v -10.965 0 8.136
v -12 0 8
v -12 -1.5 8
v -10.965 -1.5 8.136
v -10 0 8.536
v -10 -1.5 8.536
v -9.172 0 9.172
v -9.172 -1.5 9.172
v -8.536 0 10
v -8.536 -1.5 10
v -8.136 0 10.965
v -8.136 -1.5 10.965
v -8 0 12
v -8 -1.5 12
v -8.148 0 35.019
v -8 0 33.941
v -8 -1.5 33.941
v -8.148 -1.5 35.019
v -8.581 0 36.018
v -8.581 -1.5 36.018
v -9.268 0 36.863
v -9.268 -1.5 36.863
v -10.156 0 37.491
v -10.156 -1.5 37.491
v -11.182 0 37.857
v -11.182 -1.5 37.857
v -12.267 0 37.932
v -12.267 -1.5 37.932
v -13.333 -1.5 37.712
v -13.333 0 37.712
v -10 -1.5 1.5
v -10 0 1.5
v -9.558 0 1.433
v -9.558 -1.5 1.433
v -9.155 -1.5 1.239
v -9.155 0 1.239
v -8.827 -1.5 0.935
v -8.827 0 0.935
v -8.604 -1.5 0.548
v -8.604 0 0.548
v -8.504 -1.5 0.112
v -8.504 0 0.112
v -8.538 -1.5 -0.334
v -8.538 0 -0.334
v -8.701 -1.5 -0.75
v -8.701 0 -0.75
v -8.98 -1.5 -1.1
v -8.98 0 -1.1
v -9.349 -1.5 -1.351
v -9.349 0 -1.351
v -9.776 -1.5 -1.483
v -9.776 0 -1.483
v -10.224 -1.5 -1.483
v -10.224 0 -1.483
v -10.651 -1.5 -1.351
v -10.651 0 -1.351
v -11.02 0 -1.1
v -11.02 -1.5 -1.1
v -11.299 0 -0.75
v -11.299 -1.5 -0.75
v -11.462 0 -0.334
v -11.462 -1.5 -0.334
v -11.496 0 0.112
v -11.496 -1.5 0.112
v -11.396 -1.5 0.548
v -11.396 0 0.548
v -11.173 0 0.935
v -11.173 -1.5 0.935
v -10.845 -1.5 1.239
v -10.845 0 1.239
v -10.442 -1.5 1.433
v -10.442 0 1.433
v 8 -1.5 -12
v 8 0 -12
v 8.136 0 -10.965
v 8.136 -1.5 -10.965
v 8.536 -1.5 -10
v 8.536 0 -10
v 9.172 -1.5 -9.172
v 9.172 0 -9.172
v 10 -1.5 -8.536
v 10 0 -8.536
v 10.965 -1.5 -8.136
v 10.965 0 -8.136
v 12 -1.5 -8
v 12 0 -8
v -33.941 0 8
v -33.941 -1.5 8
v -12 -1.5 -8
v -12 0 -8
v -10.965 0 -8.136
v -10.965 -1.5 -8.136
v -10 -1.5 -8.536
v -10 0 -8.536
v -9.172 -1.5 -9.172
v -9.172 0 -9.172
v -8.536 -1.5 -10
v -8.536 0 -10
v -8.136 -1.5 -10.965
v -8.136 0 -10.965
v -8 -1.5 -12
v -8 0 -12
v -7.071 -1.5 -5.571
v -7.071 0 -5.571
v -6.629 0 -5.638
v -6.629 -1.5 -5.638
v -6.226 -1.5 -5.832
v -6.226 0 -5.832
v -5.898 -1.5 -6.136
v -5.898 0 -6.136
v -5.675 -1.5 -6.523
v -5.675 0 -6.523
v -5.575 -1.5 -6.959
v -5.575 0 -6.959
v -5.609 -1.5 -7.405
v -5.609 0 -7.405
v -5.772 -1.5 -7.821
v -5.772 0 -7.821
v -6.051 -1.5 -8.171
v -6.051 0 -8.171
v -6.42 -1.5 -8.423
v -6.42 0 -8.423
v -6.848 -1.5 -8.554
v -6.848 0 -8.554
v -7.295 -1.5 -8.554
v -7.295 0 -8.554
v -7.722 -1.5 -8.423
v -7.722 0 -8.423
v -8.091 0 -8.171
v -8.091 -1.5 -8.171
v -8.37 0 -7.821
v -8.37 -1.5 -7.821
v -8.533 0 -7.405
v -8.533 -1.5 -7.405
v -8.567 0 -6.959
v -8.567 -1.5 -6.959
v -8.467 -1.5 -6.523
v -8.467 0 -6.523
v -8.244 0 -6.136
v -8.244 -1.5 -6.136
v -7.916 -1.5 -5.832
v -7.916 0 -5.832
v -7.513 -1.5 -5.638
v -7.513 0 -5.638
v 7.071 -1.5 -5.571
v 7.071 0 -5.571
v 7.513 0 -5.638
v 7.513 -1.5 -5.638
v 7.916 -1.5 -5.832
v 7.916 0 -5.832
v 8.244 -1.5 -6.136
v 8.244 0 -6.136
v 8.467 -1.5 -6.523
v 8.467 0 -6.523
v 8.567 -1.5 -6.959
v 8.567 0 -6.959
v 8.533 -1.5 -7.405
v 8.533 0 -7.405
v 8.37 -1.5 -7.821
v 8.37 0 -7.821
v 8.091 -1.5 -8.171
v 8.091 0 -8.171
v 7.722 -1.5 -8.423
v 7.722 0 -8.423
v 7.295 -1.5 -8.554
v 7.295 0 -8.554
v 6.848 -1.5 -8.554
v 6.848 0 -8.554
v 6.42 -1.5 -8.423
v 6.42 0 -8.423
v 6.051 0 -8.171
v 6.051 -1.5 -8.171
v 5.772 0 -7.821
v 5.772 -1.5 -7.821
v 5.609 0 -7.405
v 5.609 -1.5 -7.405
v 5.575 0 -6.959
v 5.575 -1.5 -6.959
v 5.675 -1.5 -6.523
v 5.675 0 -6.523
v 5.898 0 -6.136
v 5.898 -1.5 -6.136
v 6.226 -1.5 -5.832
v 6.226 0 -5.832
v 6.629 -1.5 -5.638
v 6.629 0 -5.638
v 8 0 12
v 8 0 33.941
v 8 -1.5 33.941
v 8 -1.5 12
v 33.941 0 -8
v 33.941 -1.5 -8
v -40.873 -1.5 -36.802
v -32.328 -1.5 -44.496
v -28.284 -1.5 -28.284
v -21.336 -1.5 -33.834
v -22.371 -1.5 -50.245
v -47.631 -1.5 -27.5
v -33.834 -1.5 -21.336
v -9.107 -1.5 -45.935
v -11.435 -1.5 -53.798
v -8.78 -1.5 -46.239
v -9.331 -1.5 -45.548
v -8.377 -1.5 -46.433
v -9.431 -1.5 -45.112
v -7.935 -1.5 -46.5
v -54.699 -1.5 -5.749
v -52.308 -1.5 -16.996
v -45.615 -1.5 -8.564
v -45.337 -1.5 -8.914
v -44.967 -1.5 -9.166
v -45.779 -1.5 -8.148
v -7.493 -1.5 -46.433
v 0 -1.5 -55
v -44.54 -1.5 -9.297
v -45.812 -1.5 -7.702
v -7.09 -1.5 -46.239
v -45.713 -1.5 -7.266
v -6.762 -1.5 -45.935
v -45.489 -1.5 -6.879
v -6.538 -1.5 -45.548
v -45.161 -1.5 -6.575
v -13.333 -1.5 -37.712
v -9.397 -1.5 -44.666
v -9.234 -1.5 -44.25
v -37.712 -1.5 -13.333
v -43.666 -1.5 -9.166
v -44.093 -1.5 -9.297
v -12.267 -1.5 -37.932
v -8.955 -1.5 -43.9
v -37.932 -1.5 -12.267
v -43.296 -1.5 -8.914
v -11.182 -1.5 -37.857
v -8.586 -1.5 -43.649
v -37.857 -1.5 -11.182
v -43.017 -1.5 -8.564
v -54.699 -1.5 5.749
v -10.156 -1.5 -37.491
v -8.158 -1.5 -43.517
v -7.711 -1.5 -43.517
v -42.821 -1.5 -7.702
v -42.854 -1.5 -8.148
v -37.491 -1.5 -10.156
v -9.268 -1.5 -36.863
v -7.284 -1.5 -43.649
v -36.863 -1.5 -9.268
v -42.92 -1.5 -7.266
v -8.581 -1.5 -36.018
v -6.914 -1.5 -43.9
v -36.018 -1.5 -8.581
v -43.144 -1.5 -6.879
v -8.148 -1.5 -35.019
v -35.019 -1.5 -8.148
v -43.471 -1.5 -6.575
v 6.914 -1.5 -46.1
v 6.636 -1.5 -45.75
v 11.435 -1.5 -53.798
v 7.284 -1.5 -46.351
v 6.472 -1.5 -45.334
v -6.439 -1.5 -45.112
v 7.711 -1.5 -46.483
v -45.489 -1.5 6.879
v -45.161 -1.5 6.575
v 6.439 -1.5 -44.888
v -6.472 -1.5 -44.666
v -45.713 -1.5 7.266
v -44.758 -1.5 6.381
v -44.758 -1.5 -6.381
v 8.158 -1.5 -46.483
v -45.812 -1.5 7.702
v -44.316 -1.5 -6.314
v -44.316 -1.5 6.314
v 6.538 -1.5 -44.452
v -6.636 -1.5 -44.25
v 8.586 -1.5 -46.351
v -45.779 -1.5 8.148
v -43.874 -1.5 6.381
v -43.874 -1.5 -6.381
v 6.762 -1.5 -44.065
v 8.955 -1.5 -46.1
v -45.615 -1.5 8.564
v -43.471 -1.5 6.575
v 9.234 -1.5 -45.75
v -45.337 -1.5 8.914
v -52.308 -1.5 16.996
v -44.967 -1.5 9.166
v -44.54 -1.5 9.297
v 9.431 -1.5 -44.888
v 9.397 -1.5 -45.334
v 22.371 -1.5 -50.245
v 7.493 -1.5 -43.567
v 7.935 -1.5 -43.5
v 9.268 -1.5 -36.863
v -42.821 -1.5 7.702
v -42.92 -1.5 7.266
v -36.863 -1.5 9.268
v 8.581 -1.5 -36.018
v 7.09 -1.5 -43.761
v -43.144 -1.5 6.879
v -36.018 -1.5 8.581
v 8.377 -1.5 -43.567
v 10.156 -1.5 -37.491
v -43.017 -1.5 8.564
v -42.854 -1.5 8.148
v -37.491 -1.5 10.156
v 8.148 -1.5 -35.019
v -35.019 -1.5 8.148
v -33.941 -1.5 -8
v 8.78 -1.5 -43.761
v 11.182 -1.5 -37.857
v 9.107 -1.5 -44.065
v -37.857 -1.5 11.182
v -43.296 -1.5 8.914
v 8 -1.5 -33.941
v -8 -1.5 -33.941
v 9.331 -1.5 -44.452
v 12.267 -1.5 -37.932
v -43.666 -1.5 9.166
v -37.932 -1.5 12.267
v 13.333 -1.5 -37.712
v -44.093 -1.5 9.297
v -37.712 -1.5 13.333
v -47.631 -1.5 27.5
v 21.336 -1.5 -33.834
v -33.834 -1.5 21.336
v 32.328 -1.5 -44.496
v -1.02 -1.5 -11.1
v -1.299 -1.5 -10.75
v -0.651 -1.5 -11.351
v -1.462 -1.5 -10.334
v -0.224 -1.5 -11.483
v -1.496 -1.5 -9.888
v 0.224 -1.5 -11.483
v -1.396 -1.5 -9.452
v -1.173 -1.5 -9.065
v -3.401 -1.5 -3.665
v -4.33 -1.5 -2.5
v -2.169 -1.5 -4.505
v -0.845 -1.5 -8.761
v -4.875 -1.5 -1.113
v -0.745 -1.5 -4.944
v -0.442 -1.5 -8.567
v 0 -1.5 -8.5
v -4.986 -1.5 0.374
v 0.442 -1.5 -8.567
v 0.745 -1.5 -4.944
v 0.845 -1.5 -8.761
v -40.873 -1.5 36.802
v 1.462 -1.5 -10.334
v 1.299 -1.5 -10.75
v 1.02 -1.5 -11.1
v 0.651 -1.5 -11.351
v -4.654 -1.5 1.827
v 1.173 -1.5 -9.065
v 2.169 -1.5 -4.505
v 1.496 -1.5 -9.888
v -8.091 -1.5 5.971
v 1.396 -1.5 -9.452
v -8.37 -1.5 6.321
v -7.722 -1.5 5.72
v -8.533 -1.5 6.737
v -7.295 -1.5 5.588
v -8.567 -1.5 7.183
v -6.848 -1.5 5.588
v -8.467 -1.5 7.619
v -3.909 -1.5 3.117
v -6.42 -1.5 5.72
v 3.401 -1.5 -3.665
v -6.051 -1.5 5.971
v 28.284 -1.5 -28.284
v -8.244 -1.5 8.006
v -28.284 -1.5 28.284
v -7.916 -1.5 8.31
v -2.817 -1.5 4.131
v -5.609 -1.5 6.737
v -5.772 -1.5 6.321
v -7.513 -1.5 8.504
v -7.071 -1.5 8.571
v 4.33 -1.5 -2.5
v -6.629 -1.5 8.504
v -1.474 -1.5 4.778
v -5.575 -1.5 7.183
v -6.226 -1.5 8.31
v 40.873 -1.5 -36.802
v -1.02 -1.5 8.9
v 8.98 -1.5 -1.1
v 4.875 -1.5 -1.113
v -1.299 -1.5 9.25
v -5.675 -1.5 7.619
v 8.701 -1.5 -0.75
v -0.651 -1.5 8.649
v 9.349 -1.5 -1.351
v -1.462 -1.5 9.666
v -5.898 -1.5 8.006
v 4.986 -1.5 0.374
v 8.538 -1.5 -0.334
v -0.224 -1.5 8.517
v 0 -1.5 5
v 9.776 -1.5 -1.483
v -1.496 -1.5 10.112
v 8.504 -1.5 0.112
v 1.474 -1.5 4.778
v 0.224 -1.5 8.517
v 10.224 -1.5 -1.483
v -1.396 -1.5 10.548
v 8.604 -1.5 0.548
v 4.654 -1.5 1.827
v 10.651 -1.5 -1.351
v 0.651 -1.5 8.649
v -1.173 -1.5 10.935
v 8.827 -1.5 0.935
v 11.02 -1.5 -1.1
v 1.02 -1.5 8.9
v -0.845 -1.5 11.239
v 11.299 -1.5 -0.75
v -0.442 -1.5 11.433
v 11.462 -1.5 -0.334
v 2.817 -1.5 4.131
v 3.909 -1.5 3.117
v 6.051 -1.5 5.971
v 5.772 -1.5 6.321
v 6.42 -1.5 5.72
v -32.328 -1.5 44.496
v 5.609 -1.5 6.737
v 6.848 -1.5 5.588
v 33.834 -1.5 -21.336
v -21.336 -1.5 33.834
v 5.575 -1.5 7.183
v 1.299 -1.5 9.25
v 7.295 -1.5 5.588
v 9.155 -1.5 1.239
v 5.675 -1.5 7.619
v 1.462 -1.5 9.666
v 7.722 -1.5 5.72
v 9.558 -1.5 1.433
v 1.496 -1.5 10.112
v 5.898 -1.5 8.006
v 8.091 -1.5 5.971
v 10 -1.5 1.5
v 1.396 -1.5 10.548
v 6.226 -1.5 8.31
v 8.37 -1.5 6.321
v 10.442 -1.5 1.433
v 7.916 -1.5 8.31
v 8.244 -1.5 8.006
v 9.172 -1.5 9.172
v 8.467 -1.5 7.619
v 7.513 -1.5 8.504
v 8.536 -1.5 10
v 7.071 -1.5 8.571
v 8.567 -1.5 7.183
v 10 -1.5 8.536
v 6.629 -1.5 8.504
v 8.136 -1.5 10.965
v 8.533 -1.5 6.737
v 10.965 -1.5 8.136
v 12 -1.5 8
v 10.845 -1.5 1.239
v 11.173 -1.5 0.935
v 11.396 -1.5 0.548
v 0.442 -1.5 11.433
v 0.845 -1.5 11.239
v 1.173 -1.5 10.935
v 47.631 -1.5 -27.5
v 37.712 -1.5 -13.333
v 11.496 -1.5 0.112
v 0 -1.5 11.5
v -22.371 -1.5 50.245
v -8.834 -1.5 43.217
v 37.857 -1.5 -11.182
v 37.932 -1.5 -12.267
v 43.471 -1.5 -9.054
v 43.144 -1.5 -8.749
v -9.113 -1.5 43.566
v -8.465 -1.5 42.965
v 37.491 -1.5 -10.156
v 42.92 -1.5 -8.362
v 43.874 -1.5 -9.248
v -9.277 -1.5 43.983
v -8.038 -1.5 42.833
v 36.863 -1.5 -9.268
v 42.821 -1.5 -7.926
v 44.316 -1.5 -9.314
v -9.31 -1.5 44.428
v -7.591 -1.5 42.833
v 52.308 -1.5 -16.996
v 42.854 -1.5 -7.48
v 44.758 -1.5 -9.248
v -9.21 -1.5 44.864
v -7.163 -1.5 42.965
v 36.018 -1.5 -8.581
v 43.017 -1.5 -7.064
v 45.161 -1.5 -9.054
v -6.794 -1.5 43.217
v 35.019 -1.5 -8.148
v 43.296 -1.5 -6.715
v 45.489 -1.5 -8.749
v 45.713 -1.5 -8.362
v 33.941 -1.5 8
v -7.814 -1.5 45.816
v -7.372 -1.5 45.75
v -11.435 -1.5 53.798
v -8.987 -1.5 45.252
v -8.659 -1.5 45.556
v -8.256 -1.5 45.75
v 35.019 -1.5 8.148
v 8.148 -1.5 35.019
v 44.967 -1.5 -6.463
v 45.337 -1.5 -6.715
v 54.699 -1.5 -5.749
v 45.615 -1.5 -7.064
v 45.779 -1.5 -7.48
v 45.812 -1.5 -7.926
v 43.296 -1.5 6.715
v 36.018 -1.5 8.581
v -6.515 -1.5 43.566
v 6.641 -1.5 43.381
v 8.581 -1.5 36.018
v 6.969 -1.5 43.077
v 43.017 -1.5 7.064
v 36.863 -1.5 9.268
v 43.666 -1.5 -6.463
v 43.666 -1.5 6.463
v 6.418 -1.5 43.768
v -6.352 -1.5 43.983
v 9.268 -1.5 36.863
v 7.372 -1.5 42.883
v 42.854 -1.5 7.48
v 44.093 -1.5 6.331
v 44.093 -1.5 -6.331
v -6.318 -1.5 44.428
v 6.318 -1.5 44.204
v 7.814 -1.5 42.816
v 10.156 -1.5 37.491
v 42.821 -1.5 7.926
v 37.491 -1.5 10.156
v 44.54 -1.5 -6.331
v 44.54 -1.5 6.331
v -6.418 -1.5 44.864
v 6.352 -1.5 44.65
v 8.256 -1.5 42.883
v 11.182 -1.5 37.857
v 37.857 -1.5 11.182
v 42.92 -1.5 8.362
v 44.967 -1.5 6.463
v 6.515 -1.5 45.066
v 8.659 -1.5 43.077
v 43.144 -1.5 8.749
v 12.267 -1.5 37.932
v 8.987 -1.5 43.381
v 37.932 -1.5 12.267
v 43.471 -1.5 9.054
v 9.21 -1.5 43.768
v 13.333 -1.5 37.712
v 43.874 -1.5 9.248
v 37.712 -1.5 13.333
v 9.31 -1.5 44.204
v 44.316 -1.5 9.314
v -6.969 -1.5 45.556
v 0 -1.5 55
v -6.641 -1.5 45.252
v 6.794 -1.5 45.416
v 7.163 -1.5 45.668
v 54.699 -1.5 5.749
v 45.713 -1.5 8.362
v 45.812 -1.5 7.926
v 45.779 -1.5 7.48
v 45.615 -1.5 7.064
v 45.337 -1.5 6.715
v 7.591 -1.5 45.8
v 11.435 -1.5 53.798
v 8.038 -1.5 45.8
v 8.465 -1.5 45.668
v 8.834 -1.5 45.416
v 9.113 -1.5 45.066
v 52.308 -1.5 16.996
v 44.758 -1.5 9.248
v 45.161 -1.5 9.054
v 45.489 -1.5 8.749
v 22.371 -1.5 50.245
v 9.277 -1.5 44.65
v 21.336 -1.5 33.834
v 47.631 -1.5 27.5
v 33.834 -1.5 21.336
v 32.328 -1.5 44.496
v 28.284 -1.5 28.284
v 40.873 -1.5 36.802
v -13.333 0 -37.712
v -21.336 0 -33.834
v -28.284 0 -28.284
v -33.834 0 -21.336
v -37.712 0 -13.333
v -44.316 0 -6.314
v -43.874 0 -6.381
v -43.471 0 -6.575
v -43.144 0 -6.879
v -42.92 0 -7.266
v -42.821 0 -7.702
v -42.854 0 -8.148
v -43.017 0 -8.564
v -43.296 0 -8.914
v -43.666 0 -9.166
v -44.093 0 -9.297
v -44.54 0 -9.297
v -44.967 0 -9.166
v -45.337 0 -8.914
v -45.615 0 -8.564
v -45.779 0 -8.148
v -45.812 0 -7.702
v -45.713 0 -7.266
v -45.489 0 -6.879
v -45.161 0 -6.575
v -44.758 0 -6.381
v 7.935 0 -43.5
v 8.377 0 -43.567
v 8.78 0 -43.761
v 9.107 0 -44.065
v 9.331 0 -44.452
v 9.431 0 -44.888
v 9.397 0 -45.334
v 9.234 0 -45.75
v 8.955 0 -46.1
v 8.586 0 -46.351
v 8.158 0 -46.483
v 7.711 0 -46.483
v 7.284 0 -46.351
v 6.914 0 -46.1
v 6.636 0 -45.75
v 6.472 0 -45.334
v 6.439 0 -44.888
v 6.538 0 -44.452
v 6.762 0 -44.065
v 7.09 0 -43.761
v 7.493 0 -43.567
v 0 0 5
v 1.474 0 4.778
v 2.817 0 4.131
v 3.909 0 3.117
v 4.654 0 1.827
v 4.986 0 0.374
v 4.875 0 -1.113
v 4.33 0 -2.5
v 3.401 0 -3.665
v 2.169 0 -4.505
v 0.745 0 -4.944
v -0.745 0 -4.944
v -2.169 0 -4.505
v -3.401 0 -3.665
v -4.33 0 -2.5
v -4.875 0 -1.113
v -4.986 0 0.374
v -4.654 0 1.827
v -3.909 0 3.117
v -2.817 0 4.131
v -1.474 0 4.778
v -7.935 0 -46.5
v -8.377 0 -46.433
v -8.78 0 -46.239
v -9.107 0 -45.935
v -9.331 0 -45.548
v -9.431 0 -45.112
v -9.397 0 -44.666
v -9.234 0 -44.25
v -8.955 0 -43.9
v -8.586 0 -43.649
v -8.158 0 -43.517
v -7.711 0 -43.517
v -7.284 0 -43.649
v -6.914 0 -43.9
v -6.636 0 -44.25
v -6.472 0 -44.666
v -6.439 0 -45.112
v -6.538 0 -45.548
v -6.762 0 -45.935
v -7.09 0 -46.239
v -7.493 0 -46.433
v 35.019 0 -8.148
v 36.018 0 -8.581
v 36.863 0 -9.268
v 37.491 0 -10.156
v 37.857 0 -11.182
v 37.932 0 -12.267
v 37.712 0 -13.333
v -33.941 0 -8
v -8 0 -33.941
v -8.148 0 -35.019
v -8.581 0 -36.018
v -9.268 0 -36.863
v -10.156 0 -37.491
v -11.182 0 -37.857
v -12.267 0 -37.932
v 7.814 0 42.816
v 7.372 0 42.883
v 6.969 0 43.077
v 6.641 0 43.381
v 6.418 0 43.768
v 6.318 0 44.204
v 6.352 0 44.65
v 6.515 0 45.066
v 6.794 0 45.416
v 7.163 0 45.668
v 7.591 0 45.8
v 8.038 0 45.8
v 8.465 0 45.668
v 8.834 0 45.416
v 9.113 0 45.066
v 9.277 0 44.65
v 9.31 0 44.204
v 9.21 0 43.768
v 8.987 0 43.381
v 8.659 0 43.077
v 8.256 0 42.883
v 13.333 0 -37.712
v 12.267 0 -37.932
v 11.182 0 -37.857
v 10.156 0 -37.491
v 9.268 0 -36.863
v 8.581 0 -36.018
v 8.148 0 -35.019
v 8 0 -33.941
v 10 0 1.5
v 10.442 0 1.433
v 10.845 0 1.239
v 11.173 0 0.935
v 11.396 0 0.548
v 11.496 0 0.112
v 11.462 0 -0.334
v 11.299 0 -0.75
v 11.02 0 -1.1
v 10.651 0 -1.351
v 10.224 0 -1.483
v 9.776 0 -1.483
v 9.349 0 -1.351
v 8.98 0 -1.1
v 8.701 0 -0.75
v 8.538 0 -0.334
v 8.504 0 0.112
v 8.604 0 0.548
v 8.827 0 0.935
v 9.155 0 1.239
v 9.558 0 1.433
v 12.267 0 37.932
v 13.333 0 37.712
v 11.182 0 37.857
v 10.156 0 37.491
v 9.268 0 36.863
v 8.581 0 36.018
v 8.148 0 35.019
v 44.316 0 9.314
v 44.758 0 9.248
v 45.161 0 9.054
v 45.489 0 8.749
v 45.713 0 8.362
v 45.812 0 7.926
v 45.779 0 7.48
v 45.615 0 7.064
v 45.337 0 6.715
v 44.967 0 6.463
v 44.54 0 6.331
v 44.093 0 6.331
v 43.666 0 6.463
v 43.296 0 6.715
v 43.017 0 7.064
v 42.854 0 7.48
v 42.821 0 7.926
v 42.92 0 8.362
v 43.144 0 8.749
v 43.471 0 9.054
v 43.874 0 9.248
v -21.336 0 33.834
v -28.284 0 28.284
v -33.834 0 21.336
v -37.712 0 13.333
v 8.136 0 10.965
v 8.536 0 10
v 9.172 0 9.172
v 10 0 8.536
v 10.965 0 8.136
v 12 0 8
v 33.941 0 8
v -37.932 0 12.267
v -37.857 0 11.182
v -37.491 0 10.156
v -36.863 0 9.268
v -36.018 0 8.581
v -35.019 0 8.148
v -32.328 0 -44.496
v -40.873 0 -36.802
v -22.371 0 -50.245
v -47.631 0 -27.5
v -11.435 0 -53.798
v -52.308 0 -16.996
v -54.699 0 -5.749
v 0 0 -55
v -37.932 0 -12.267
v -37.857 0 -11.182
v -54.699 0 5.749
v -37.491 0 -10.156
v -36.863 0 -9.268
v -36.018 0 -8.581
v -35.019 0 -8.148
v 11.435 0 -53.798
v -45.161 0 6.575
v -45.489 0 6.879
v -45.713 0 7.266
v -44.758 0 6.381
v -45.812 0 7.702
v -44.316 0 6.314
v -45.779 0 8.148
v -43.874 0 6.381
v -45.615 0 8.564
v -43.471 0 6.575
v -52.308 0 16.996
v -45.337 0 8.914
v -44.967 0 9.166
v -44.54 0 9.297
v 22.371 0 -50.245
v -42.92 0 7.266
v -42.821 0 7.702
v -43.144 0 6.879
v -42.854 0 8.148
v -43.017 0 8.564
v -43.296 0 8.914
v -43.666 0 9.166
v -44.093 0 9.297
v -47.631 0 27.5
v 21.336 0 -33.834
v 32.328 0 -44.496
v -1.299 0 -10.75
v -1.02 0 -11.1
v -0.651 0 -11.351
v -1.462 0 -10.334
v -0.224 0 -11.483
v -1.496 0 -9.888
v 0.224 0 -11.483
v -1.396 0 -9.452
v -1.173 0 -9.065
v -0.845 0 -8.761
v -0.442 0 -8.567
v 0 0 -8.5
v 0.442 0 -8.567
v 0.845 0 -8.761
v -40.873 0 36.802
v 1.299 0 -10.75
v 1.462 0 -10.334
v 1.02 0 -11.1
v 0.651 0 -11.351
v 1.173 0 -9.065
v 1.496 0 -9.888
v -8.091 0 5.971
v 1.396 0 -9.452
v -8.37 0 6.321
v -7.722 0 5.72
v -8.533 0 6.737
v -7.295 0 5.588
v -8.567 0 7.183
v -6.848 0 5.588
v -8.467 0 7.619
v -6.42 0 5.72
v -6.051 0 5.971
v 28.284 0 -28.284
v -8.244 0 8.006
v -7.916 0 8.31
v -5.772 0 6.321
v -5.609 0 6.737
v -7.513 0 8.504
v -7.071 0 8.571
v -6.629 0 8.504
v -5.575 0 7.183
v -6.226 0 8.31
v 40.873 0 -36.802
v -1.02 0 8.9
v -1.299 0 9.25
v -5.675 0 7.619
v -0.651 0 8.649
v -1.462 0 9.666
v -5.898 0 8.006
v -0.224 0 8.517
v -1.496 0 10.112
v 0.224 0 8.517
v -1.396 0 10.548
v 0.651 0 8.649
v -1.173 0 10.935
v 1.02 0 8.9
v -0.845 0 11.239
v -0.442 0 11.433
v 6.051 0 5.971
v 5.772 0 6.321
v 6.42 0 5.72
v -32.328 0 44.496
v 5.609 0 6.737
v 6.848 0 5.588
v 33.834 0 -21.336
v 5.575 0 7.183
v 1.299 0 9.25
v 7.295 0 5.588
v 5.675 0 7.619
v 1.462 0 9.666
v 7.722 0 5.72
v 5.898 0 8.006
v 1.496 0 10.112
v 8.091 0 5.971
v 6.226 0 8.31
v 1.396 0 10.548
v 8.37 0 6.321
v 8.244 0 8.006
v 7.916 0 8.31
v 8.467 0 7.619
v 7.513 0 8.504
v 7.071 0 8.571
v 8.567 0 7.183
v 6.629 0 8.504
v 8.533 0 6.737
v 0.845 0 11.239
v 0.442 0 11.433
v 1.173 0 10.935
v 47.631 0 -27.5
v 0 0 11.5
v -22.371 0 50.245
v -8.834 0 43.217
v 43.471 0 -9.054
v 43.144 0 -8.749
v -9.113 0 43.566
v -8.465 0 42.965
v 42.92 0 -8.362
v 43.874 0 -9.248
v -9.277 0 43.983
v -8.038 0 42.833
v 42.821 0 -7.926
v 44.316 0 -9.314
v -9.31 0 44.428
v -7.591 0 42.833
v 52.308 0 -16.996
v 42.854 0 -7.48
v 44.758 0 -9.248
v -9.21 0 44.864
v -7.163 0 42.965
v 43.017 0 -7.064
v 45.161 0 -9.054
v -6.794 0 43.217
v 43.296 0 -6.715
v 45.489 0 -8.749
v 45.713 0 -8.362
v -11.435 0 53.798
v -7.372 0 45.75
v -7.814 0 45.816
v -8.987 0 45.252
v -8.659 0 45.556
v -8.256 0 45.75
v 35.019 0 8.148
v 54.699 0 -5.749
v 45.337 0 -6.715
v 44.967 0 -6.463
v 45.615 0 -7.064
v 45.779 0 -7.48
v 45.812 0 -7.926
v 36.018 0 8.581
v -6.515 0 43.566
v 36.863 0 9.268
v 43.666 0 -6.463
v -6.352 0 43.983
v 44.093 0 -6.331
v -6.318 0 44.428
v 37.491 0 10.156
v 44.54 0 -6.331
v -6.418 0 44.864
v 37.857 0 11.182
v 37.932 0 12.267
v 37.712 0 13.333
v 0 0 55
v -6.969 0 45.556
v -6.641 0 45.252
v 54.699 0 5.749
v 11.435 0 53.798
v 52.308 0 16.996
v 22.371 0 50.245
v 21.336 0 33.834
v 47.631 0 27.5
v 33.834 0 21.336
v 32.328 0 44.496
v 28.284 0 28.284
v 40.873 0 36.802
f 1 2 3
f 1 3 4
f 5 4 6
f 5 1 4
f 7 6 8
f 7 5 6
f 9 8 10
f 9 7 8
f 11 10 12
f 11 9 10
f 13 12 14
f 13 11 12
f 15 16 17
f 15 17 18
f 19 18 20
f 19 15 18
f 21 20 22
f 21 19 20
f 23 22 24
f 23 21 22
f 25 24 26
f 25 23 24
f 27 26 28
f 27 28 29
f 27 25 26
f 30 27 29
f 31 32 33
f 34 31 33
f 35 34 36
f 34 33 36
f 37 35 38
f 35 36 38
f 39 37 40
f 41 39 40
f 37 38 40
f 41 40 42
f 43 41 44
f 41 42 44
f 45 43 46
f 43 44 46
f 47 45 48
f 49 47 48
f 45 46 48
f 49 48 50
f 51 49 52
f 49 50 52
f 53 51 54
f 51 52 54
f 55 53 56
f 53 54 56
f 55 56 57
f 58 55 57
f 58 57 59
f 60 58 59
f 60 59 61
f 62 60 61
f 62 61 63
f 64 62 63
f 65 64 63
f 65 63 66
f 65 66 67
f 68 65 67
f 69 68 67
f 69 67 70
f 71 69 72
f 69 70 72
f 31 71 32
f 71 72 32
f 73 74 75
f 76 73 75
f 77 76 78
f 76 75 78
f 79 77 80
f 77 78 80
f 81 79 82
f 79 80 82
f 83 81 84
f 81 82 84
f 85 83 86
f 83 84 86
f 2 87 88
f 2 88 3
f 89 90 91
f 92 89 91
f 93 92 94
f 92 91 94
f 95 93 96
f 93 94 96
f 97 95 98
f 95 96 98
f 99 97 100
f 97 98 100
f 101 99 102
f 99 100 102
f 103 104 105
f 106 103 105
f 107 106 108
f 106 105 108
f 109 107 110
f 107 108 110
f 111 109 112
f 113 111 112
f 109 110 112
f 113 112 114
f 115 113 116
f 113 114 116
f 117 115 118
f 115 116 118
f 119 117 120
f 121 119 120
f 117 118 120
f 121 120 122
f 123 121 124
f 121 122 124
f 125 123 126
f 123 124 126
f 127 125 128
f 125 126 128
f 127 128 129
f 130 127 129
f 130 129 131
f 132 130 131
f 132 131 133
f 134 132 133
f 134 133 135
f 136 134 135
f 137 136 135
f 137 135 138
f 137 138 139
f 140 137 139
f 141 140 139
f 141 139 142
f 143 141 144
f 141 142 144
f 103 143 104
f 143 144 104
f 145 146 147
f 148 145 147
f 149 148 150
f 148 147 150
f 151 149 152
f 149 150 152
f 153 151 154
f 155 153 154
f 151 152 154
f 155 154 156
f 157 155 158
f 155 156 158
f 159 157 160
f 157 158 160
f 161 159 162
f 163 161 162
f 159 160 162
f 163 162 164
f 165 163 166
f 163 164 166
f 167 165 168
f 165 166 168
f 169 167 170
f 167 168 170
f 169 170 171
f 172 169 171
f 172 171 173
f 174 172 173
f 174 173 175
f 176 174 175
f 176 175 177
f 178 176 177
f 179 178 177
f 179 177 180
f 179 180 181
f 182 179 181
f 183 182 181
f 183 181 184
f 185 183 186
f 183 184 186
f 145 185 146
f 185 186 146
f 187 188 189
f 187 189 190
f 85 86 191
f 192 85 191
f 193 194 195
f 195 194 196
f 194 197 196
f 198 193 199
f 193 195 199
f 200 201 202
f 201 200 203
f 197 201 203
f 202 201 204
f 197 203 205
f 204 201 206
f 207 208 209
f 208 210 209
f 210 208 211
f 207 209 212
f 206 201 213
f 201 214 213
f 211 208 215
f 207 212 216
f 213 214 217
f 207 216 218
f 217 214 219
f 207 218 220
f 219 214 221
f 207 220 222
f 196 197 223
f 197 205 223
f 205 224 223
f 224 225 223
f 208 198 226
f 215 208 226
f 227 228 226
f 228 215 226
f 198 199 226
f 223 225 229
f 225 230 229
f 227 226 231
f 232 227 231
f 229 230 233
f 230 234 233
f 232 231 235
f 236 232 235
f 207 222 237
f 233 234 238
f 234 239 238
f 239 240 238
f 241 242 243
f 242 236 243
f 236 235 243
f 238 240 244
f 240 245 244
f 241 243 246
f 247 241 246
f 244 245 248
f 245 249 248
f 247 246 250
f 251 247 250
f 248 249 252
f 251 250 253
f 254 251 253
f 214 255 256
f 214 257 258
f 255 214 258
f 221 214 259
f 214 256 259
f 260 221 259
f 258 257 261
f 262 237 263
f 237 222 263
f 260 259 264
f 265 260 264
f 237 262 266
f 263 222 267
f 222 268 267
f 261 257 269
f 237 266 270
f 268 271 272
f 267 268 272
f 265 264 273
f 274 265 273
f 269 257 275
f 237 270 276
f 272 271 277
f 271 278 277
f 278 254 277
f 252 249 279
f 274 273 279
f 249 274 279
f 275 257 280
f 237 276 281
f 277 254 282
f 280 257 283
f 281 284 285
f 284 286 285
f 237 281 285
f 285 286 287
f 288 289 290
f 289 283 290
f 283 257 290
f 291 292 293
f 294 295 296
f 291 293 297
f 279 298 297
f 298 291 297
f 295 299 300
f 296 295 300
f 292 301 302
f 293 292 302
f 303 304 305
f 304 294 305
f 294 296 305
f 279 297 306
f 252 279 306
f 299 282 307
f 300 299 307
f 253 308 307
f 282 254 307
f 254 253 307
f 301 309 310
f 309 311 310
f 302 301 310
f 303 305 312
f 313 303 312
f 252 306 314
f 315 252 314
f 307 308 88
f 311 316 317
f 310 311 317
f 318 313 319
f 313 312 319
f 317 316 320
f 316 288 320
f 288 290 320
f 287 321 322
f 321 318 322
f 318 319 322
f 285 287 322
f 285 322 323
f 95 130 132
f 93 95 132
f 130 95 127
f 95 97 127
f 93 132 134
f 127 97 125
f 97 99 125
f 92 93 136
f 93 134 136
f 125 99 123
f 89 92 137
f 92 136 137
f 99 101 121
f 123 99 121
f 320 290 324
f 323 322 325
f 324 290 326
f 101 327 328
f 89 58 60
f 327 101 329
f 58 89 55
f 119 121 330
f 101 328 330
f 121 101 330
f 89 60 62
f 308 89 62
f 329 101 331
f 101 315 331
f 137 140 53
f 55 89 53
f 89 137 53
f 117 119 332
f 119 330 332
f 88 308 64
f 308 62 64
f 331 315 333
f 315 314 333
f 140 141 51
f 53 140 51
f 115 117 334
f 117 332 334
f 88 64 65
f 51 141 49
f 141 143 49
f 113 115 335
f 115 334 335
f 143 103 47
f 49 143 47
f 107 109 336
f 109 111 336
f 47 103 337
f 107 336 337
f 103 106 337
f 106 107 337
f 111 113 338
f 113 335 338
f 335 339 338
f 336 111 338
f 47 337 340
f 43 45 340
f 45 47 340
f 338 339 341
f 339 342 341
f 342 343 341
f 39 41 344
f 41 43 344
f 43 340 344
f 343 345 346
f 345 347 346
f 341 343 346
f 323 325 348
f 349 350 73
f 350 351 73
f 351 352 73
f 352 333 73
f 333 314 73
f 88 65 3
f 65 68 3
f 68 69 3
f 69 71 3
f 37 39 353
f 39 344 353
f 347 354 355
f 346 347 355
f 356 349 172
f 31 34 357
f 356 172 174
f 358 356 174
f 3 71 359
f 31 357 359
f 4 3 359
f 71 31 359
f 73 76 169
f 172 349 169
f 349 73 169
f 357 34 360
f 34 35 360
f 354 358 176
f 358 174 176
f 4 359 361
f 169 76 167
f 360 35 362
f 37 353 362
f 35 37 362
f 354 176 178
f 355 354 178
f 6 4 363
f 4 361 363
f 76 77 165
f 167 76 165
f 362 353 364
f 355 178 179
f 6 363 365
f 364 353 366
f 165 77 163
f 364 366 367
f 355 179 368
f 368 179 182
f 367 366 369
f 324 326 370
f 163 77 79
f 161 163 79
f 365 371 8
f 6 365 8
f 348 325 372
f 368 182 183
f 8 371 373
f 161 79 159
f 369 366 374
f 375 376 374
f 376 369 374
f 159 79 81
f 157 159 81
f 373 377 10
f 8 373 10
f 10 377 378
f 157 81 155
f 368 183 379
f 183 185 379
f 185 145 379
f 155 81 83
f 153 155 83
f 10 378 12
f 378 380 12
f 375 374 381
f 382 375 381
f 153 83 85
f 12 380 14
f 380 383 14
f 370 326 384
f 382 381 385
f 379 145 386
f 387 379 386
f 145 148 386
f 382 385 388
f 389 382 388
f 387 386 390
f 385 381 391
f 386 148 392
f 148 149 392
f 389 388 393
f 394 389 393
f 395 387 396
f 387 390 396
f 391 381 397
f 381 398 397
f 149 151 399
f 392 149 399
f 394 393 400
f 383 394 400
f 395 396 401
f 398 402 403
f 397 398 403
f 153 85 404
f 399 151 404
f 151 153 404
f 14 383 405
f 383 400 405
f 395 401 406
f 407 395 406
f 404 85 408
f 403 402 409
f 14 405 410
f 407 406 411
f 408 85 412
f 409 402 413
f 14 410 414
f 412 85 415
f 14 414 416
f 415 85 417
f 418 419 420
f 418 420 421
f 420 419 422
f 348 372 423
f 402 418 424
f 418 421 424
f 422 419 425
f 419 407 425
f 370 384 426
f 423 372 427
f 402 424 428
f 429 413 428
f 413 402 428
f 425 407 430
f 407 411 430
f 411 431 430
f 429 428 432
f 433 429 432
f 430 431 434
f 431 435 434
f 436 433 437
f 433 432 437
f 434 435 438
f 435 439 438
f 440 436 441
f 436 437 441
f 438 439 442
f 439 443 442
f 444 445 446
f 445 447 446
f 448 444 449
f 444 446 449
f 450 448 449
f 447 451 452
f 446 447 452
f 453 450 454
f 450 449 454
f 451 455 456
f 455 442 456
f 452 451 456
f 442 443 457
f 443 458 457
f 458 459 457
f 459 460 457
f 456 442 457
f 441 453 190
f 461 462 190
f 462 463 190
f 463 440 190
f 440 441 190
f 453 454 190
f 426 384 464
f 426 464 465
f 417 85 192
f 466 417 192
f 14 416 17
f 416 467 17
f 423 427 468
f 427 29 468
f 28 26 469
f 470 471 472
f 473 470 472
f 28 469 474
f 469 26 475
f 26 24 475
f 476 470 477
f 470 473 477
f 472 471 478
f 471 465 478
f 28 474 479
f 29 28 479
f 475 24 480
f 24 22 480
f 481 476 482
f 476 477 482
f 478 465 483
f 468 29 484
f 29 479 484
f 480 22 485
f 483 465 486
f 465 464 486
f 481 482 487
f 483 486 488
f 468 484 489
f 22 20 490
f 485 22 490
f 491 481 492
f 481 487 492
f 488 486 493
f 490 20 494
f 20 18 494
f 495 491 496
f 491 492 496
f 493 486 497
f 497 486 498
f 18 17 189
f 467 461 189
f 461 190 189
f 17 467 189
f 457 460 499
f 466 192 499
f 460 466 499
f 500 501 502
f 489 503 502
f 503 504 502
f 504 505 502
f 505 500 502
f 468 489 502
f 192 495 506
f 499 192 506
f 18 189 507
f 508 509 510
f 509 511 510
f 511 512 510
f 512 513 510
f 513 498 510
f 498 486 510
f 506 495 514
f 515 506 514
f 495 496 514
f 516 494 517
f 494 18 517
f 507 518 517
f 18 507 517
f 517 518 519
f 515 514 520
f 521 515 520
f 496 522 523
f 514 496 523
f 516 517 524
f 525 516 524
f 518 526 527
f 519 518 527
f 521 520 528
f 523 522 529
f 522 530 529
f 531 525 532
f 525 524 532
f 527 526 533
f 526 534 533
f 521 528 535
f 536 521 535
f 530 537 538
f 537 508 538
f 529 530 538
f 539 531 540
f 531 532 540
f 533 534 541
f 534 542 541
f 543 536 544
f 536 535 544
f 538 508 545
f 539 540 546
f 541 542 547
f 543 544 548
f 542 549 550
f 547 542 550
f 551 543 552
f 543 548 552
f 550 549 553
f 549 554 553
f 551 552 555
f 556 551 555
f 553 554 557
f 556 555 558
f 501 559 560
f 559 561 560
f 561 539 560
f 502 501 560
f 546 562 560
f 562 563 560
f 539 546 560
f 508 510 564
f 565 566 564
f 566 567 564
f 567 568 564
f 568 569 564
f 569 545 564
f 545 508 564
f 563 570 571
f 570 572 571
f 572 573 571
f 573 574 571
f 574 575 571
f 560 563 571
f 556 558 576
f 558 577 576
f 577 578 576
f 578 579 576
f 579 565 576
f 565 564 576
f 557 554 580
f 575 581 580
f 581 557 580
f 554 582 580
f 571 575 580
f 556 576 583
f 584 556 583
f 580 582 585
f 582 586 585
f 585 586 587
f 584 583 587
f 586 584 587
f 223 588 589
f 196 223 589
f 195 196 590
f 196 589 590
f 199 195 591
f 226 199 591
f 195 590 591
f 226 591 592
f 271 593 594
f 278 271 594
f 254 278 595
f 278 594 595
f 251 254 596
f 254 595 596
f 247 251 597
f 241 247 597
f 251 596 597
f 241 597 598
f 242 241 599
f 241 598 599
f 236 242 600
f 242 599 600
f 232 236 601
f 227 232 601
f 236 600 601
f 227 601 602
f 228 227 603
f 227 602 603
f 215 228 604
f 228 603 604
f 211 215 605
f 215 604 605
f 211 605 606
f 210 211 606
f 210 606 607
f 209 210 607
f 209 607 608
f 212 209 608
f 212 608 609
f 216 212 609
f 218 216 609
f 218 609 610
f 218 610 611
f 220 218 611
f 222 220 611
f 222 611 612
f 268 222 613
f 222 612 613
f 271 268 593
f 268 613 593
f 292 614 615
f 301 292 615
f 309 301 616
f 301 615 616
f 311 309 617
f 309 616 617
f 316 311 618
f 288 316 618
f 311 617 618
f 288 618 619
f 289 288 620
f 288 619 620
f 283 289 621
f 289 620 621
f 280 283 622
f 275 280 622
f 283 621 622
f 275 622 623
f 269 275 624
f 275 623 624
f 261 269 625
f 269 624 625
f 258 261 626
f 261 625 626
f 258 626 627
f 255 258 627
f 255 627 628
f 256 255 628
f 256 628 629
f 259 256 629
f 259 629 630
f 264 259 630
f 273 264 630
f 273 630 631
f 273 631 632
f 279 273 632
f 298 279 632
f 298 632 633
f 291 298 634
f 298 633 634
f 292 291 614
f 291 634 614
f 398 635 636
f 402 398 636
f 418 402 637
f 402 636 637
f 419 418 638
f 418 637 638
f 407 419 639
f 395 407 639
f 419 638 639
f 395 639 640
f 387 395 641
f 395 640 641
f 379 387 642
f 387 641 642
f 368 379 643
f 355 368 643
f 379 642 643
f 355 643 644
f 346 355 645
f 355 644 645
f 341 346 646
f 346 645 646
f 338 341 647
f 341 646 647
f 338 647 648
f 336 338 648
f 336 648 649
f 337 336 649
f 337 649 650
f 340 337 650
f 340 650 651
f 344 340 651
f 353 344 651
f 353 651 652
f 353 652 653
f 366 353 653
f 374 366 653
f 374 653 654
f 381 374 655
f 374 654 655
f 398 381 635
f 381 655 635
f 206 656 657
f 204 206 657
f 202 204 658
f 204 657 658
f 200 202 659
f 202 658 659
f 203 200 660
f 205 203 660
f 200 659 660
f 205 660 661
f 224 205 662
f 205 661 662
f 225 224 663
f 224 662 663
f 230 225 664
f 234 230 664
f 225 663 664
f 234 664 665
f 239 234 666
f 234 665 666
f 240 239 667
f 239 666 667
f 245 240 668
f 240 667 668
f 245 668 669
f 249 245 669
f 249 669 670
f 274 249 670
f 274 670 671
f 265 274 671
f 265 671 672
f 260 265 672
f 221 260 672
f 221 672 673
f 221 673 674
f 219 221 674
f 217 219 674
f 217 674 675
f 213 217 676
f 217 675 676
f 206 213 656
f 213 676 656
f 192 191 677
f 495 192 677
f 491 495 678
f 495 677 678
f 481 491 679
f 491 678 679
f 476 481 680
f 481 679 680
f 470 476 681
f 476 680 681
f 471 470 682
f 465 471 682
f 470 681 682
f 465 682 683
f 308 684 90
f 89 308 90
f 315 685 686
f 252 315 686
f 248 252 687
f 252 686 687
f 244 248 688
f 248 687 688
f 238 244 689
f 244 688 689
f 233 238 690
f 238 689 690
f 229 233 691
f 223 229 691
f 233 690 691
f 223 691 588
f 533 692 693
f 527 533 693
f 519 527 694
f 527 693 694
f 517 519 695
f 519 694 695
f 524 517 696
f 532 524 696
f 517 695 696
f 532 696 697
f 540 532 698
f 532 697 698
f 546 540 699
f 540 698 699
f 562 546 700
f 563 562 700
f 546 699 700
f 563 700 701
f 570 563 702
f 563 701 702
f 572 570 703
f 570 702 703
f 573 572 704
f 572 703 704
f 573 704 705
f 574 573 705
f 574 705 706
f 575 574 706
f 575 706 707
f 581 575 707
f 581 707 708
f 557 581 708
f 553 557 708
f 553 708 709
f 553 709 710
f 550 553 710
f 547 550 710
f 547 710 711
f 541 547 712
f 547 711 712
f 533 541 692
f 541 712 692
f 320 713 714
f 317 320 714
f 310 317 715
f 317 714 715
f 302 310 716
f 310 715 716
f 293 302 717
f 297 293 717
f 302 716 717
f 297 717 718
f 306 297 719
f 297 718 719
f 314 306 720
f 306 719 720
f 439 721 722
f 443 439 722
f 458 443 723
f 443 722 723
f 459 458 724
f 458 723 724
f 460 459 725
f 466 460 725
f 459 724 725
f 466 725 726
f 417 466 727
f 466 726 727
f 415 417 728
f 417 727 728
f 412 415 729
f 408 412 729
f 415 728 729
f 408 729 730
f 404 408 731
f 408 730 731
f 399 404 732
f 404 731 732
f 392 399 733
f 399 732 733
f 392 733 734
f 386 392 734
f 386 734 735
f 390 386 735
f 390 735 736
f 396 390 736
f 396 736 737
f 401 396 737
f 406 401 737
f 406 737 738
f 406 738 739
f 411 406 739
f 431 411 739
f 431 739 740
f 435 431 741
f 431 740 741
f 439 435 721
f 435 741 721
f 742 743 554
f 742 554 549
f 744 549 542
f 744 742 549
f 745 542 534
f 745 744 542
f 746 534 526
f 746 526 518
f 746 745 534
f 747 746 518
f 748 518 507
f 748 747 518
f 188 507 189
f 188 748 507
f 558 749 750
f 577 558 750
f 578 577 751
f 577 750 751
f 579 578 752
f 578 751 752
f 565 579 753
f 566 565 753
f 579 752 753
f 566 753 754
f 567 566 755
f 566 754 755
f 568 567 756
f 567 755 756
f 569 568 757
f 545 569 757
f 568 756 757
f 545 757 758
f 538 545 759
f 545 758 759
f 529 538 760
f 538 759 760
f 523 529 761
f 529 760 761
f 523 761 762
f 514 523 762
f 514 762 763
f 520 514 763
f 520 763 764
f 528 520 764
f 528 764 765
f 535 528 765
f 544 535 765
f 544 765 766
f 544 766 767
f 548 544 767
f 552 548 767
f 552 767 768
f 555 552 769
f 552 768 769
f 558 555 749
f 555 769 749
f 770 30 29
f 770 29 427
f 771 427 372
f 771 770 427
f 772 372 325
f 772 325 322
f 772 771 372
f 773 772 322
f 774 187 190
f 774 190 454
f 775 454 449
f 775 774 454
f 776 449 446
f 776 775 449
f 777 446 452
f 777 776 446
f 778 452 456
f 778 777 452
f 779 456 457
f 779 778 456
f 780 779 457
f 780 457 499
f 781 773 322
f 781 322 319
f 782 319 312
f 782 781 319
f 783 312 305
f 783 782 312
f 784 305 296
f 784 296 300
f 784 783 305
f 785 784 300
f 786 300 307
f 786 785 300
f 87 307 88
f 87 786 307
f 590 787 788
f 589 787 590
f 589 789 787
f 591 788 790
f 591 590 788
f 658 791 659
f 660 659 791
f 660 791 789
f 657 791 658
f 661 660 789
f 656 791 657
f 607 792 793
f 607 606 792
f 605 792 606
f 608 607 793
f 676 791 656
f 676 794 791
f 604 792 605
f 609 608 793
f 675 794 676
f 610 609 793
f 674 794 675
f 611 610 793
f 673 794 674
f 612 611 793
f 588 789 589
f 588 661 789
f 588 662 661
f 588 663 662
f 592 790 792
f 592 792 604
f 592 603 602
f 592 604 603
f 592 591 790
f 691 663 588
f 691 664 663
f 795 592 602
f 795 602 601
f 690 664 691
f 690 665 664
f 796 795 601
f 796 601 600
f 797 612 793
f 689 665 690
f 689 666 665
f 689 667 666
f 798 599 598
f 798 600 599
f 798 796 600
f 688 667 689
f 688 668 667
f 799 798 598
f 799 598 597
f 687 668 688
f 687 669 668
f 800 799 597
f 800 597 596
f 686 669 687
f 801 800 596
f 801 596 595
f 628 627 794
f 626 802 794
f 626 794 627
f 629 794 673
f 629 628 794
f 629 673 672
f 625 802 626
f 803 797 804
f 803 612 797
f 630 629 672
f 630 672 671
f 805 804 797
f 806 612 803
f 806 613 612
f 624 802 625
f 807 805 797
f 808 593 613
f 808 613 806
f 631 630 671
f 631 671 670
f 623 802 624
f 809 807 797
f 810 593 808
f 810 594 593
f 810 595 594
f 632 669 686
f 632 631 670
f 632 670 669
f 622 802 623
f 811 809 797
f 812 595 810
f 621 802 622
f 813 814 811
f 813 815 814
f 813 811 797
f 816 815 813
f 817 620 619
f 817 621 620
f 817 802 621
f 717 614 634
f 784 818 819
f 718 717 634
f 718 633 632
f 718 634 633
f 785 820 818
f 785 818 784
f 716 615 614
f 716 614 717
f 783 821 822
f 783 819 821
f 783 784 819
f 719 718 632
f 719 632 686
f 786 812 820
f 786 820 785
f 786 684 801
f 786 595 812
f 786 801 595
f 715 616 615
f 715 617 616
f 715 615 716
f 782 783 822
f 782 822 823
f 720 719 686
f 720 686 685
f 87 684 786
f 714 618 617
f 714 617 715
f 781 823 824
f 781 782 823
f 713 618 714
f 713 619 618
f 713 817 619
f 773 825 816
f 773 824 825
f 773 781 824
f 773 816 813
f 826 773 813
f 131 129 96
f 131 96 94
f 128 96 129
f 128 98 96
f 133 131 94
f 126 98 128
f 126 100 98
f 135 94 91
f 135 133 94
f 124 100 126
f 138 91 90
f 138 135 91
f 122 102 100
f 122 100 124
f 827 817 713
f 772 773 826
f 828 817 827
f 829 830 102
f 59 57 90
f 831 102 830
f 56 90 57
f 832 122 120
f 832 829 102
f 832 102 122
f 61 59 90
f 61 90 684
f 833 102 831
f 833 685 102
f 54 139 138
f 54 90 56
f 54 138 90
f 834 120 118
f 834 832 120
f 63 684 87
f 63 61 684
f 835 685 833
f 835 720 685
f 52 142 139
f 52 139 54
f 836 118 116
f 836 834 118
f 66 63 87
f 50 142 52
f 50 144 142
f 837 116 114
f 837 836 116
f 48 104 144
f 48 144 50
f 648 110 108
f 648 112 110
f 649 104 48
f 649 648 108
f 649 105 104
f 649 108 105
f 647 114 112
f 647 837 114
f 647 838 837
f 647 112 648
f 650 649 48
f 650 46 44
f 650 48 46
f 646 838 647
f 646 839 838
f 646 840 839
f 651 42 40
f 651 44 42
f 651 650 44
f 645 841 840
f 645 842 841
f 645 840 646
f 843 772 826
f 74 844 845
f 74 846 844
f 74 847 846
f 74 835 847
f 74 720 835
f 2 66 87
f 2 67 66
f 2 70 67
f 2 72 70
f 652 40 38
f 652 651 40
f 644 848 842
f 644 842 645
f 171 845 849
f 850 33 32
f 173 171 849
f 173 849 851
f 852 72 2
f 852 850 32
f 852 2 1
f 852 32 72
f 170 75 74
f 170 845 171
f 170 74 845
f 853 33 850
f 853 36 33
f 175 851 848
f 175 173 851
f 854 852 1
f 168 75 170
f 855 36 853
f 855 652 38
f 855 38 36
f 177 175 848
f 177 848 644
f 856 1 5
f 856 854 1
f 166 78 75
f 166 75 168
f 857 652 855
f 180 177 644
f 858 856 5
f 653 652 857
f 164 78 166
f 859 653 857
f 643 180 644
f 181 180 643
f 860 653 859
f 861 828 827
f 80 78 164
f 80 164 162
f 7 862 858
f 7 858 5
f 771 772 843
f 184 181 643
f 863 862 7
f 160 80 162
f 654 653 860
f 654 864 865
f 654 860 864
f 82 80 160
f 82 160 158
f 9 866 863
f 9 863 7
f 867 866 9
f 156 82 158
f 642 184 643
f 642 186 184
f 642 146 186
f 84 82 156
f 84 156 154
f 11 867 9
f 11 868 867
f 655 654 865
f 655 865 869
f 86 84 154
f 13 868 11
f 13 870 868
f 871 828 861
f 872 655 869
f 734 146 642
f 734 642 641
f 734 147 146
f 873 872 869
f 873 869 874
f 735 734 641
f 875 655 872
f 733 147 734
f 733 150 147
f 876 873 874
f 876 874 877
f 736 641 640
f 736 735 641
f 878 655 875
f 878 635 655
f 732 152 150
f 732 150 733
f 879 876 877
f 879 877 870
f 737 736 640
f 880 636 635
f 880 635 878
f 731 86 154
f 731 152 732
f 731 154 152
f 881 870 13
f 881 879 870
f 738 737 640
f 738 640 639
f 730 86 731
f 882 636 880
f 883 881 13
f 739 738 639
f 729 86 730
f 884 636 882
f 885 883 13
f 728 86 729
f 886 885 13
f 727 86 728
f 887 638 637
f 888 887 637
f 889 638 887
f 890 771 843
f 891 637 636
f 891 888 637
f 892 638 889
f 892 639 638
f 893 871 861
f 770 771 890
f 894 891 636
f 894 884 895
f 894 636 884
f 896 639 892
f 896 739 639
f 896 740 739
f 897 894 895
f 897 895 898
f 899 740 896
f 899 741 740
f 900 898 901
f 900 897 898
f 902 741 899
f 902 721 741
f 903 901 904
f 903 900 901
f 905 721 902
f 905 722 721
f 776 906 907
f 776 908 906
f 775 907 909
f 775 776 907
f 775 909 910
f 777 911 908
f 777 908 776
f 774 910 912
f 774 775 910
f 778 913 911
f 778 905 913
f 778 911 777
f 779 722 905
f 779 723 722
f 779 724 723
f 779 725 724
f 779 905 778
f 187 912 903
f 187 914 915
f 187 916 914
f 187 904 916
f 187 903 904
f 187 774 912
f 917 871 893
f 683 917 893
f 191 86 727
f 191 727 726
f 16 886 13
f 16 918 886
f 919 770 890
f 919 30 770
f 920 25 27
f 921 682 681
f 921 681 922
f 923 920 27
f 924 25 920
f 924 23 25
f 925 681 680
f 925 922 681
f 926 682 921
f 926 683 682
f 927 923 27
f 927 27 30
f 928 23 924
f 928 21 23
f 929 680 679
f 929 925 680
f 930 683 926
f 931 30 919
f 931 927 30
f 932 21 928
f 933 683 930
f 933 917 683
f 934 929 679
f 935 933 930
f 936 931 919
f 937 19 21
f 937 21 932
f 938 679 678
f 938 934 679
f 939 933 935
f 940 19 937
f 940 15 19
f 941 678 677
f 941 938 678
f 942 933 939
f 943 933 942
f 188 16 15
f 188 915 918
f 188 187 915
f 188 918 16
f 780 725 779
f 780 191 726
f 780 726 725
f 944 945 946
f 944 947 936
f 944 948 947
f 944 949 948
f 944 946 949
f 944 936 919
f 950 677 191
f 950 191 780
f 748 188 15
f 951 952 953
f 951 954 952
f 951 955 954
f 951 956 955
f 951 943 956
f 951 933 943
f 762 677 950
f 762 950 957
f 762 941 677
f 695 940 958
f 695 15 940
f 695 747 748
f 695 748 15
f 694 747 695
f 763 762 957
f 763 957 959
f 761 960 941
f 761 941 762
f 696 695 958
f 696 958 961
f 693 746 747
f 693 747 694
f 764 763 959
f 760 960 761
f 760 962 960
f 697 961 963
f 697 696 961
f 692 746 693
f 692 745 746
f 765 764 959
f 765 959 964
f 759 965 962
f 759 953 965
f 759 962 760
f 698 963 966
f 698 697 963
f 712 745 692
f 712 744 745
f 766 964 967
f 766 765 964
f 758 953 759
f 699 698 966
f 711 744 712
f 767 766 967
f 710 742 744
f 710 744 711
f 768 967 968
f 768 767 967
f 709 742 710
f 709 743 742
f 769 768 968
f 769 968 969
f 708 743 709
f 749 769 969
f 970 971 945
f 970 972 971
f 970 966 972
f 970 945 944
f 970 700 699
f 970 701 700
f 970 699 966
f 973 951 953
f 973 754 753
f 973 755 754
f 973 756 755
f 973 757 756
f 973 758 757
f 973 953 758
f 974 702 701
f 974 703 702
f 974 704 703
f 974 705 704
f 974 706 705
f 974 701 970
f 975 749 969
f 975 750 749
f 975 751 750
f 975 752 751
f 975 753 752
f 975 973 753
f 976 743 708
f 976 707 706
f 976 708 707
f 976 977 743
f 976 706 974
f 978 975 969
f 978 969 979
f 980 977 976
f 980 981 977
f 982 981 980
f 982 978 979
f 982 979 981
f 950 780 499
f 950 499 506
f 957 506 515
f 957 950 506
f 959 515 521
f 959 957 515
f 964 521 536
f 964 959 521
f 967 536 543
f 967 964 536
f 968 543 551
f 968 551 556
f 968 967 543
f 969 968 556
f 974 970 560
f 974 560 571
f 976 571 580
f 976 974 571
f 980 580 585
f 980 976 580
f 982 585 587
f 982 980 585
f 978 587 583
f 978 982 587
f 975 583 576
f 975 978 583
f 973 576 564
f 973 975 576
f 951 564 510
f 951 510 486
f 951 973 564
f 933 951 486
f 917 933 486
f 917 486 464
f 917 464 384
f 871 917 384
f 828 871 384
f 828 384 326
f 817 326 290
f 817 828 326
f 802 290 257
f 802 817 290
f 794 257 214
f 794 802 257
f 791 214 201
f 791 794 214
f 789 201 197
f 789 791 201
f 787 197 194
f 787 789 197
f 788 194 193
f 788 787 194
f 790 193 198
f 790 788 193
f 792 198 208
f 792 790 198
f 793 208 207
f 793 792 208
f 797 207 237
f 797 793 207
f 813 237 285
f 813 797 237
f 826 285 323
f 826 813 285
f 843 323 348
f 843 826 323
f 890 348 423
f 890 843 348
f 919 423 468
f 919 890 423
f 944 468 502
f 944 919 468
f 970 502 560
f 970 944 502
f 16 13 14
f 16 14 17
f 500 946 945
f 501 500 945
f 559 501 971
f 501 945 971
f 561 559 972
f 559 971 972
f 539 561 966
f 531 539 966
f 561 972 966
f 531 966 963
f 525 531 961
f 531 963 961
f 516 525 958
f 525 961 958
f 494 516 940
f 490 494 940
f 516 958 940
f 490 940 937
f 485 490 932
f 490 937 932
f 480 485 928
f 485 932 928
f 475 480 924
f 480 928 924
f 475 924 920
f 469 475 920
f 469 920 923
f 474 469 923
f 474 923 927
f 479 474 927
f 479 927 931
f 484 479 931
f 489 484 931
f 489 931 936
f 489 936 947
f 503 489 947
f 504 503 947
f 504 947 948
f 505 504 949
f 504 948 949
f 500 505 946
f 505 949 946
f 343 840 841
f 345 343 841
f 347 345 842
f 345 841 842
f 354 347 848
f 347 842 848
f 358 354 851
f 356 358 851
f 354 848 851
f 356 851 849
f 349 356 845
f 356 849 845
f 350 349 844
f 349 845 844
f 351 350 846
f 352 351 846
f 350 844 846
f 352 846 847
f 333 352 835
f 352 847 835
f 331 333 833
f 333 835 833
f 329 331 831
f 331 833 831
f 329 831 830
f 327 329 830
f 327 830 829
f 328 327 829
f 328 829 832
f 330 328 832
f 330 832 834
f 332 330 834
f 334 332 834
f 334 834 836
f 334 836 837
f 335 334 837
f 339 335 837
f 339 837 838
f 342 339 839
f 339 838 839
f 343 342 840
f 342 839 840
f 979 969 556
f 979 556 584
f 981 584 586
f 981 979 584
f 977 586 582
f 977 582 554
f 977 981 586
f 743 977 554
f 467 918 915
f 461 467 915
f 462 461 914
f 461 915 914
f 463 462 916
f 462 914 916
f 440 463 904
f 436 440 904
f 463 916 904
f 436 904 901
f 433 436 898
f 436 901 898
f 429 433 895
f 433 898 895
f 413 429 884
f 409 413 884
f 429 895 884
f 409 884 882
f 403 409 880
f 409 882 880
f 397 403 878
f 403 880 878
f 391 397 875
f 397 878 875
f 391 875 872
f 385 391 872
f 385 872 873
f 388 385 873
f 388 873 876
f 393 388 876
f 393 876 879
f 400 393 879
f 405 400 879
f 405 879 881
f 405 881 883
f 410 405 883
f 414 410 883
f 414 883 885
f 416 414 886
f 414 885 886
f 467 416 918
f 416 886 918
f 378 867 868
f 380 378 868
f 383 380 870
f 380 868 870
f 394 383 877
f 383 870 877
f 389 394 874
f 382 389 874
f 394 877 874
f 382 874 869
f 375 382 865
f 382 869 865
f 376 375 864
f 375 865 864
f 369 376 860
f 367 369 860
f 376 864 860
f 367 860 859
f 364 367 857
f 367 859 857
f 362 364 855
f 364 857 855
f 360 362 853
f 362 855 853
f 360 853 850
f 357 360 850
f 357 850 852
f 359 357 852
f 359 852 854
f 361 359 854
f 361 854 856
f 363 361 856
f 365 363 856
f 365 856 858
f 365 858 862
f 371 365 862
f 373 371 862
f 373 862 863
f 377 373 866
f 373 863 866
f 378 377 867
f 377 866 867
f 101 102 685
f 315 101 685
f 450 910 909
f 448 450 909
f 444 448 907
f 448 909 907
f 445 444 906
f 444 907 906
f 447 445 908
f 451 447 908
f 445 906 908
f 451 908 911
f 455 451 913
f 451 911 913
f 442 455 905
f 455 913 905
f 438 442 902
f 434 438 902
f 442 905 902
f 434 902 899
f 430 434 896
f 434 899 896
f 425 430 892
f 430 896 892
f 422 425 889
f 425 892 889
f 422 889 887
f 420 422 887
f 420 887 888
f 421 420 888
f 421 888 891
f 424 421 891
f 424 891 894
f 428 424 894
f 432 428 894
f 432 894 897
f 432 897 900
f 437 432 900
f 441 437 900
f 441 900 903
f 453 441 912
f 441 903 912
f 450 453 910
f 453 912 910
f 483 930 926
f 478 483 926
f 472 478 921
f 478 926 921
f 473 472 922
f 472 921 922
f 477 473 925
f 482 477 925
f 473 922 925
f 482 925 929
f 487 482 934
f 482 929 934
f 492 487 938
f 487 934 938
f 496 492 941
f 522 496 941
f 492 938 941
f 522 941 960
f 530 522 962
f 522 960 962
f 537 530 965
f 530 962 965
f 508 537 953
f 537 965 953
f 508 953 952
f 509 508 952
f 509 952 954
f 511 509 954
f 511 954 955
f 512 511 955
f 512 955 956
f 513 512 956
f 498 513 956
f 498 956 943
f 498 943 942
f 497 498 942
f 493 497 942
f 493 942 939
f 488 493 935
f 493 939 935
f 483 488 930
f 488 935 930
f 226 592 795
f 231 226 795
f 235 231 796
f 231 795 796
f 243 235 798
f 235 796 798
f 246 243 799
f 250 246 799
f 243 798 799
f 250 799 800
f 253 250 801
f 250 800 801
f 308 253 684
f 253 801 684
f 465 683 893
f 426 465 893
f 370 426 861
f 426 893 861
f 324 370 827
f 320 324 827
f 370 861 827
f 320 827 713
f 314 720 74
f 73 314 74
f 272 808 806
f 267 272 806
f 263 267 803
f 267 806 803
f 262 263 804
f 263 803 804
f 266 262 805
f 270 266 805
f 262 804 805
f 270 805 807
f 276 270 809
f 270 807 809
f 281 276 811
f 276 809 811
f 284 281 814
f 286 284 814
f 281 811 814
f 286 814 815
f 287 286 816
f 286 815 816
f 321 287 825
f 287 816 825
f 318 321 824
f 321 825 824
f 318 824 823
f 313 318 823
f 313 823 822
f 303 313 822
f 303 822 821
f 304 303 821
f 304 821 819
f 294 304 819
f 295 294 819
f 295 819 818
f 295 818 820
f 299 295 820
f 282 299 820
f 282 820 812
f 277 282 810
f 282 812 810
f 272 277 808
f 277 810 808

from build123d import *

# Parameters (mm, degrees)
SKETCH1_R           = 55
SKETCH1_R_2         = 5
BOSS_EXTRUDE1_DEPTH = 1.5
SKETCH2_R           = 1.5
CUT_EXTRUDE1_DEPTH  = 1.5


with BuildPart() as part:
    # Sketch1 → Boss-Extrude1 (new body)
    with BuildSketch(Plane(origin=(0, 0, 0), x_dir=(1, 0, 0), z_dir=(0, 1, 0))):
        with Locations(Location((0, 0, 0), (0, 0, 270))):
            Circle(SKETCH1_R)
        with Locations(Location((0, 0, 0), (0, 0, 270))):
            Circle(SKETCH1_R_2, mode=Mode.SUBTRACT)
        with BuildLine():
            Line((8, 33.941125497), (8, 12))
            ThreePointArc((8, 12), (9.171572875, 9.171572875), (12, 8))
            Line((12, 8), (33.941125497, 8))
            ThreePointArc((33.941125497, 8), (37.207111821, 9.690598923), (37.712361663, 13.333333333))
            ThreePointArc((37.712361663, 13.333333333), (28.284271247, 28.284271247), (13.333333333, 37.712361663))
            ThreePointArc((13.333333333, 37.712361663), (9.690598923, 37.207111821), (8, 33.941125497))
        make_face(mode=Mode.SUBTRACT)
        with BuildLine():
            Line((-33.941125497, 8), (-12, 8))
            ThreePointArc((-12, 8), (-9.171572875, 9.171572875), (-8, 12))
            Line((-8, 12), (-8, 33.941125497))
            ThreePointArc((-8, 33.941125497), (-9.690598923, 37.207111821), (-13.333333333, 37.712361663))
            ThreePointArc((-13.333333333, 37.712361663), (-28.284271247, 28.284271247), (-37.712361663, 13.333333333))
            ThreePointArc((-37.712361663, 13.333333333), (-37.207111821, 9.690598923), (-33.941125497, 8))
        make_face(mode=Mode.SUBTRACT)
        with BuildLine():
            Line((-33.941125497, -8), (-12, -8))
            ThreePointArc((-12, -8), (-9.171572875, -9.171572875), (-8, -12))
            Line((-8, -12), (-8, -33.941125497))
            ThreePointArc((-8, -33.941125497), (-9.690598923, -37.207111821), (-13.333333333, -37.712361663))
            ThreePointArc((-13.333333333, -37.712361663), (-28.284271247, -28.284271247), (-37.712361663, -13.333333333))
            ThreePointArc((-37.712361663, -13.333333333), (-37.207111821, -9.690598923), (-33.941125497, -8))
        make_face(mode=Mode.SUBTRACT)
        with BuildLine():
            Line((12, -8), (33.941125497, -8))
            ThreePointArc((33.941125497, -8), (37.207111821, -9.690598923), (37.712361663, -13.333333333))
            ThreePointArc((37.712361663, -13.333333333), (28.284271247, -28.284271247), (13.333333333, -37.712361663))
            ThreePointArc((13.333333333, -37.712361663), (9.690598923, -37.207111821), (8, -33.941125497))
            Line((8, -33.941125497), (8, -12))
            ThreePointArc((8, -12), (9.171572875, -9.171572875), (12, -8))
        make_face(mode=Mode.SUBTRACT)
    extrude(amount=-BOSS_EXTRUDE1_DEPTH)

    # Sketch2 → Cut-Extrude1 (cut)
    with BuildSketch(Plane(origin=(0, 0, 0), x_dir=(1, 0, 0), z_dir=(0, 1, 0))):
        with Locations(Location((10, 0, 0), (0, 0, 270))):
            Circle(SKETCH2_R)
        with Locations(Location((7.071067812, -7.071067812, 0), (0, 0, 270))):
            Circle(SKETCH2_R)
        with Locations(Location((0, -10, 0), (0, 0, 270))):
            Circle(SKETCH2_R)
        with Locations(Location((-7.071067812, -7.071067812, 0), (0, 0, 270))):
            Circle(SKETCH2_R)
        with Locations(Location((-10, 0, 0), (0, 0, 270))):
            Circle(SKETCH2_R)
        with Locations(Location((-7.071067812, 7.071067812, 0), (0, 0, 270))):
            Circle(SKETCH2_R)
        with Locations(Location((0, 10, 0), (0, 0, 270))):
            Circle(SKETCH2_R)
        with Locations(Location((7.071067812, 7.071067812, 0), (0, 0, 270))):
            Circle(SKETCH2_R)
        with Locations(Location((-44.316348886, 7.814167995, 0), (0, 0, 270))):
            Circle(SKETCH2_R)
        with Locations(Location((-44.316348886, -7.814167995, 0), (0, 0, 90))):
            Circle(SKETCH2_R)
        with Locations(Location((7.934714132, 45, 0), (0, 0, 270))):
            Circle(SKETCH2_R)
        with Locations(Location((-7.934714132, 45, 0), (0, 0, 90))):
            Circle(SKETCH2_R)
        with Locations(Location((44.316348886, -7.814167995, 0), (0, 0, 270))):
            Circle(SKETCH2_R)
        with Locations(Location((44.316348886, 7.814167995, 0), (0, 0, 90))):
            Circle(SKETCH2_R)
        with Locations(Location((-7.814167995, -44.316348886, 0), (0, 0, 270))):
            Circle(SKETCH2_R)
        with Locations(Location((7.814167995, -44.316348886, 0), (0, 0, 90))):
            Circle(SKETCH2_R)
    extrude(amount=-CUT_EXTRUDE1_DEPTH, mode=Mode.SUBTRACT)


solid = part.part
